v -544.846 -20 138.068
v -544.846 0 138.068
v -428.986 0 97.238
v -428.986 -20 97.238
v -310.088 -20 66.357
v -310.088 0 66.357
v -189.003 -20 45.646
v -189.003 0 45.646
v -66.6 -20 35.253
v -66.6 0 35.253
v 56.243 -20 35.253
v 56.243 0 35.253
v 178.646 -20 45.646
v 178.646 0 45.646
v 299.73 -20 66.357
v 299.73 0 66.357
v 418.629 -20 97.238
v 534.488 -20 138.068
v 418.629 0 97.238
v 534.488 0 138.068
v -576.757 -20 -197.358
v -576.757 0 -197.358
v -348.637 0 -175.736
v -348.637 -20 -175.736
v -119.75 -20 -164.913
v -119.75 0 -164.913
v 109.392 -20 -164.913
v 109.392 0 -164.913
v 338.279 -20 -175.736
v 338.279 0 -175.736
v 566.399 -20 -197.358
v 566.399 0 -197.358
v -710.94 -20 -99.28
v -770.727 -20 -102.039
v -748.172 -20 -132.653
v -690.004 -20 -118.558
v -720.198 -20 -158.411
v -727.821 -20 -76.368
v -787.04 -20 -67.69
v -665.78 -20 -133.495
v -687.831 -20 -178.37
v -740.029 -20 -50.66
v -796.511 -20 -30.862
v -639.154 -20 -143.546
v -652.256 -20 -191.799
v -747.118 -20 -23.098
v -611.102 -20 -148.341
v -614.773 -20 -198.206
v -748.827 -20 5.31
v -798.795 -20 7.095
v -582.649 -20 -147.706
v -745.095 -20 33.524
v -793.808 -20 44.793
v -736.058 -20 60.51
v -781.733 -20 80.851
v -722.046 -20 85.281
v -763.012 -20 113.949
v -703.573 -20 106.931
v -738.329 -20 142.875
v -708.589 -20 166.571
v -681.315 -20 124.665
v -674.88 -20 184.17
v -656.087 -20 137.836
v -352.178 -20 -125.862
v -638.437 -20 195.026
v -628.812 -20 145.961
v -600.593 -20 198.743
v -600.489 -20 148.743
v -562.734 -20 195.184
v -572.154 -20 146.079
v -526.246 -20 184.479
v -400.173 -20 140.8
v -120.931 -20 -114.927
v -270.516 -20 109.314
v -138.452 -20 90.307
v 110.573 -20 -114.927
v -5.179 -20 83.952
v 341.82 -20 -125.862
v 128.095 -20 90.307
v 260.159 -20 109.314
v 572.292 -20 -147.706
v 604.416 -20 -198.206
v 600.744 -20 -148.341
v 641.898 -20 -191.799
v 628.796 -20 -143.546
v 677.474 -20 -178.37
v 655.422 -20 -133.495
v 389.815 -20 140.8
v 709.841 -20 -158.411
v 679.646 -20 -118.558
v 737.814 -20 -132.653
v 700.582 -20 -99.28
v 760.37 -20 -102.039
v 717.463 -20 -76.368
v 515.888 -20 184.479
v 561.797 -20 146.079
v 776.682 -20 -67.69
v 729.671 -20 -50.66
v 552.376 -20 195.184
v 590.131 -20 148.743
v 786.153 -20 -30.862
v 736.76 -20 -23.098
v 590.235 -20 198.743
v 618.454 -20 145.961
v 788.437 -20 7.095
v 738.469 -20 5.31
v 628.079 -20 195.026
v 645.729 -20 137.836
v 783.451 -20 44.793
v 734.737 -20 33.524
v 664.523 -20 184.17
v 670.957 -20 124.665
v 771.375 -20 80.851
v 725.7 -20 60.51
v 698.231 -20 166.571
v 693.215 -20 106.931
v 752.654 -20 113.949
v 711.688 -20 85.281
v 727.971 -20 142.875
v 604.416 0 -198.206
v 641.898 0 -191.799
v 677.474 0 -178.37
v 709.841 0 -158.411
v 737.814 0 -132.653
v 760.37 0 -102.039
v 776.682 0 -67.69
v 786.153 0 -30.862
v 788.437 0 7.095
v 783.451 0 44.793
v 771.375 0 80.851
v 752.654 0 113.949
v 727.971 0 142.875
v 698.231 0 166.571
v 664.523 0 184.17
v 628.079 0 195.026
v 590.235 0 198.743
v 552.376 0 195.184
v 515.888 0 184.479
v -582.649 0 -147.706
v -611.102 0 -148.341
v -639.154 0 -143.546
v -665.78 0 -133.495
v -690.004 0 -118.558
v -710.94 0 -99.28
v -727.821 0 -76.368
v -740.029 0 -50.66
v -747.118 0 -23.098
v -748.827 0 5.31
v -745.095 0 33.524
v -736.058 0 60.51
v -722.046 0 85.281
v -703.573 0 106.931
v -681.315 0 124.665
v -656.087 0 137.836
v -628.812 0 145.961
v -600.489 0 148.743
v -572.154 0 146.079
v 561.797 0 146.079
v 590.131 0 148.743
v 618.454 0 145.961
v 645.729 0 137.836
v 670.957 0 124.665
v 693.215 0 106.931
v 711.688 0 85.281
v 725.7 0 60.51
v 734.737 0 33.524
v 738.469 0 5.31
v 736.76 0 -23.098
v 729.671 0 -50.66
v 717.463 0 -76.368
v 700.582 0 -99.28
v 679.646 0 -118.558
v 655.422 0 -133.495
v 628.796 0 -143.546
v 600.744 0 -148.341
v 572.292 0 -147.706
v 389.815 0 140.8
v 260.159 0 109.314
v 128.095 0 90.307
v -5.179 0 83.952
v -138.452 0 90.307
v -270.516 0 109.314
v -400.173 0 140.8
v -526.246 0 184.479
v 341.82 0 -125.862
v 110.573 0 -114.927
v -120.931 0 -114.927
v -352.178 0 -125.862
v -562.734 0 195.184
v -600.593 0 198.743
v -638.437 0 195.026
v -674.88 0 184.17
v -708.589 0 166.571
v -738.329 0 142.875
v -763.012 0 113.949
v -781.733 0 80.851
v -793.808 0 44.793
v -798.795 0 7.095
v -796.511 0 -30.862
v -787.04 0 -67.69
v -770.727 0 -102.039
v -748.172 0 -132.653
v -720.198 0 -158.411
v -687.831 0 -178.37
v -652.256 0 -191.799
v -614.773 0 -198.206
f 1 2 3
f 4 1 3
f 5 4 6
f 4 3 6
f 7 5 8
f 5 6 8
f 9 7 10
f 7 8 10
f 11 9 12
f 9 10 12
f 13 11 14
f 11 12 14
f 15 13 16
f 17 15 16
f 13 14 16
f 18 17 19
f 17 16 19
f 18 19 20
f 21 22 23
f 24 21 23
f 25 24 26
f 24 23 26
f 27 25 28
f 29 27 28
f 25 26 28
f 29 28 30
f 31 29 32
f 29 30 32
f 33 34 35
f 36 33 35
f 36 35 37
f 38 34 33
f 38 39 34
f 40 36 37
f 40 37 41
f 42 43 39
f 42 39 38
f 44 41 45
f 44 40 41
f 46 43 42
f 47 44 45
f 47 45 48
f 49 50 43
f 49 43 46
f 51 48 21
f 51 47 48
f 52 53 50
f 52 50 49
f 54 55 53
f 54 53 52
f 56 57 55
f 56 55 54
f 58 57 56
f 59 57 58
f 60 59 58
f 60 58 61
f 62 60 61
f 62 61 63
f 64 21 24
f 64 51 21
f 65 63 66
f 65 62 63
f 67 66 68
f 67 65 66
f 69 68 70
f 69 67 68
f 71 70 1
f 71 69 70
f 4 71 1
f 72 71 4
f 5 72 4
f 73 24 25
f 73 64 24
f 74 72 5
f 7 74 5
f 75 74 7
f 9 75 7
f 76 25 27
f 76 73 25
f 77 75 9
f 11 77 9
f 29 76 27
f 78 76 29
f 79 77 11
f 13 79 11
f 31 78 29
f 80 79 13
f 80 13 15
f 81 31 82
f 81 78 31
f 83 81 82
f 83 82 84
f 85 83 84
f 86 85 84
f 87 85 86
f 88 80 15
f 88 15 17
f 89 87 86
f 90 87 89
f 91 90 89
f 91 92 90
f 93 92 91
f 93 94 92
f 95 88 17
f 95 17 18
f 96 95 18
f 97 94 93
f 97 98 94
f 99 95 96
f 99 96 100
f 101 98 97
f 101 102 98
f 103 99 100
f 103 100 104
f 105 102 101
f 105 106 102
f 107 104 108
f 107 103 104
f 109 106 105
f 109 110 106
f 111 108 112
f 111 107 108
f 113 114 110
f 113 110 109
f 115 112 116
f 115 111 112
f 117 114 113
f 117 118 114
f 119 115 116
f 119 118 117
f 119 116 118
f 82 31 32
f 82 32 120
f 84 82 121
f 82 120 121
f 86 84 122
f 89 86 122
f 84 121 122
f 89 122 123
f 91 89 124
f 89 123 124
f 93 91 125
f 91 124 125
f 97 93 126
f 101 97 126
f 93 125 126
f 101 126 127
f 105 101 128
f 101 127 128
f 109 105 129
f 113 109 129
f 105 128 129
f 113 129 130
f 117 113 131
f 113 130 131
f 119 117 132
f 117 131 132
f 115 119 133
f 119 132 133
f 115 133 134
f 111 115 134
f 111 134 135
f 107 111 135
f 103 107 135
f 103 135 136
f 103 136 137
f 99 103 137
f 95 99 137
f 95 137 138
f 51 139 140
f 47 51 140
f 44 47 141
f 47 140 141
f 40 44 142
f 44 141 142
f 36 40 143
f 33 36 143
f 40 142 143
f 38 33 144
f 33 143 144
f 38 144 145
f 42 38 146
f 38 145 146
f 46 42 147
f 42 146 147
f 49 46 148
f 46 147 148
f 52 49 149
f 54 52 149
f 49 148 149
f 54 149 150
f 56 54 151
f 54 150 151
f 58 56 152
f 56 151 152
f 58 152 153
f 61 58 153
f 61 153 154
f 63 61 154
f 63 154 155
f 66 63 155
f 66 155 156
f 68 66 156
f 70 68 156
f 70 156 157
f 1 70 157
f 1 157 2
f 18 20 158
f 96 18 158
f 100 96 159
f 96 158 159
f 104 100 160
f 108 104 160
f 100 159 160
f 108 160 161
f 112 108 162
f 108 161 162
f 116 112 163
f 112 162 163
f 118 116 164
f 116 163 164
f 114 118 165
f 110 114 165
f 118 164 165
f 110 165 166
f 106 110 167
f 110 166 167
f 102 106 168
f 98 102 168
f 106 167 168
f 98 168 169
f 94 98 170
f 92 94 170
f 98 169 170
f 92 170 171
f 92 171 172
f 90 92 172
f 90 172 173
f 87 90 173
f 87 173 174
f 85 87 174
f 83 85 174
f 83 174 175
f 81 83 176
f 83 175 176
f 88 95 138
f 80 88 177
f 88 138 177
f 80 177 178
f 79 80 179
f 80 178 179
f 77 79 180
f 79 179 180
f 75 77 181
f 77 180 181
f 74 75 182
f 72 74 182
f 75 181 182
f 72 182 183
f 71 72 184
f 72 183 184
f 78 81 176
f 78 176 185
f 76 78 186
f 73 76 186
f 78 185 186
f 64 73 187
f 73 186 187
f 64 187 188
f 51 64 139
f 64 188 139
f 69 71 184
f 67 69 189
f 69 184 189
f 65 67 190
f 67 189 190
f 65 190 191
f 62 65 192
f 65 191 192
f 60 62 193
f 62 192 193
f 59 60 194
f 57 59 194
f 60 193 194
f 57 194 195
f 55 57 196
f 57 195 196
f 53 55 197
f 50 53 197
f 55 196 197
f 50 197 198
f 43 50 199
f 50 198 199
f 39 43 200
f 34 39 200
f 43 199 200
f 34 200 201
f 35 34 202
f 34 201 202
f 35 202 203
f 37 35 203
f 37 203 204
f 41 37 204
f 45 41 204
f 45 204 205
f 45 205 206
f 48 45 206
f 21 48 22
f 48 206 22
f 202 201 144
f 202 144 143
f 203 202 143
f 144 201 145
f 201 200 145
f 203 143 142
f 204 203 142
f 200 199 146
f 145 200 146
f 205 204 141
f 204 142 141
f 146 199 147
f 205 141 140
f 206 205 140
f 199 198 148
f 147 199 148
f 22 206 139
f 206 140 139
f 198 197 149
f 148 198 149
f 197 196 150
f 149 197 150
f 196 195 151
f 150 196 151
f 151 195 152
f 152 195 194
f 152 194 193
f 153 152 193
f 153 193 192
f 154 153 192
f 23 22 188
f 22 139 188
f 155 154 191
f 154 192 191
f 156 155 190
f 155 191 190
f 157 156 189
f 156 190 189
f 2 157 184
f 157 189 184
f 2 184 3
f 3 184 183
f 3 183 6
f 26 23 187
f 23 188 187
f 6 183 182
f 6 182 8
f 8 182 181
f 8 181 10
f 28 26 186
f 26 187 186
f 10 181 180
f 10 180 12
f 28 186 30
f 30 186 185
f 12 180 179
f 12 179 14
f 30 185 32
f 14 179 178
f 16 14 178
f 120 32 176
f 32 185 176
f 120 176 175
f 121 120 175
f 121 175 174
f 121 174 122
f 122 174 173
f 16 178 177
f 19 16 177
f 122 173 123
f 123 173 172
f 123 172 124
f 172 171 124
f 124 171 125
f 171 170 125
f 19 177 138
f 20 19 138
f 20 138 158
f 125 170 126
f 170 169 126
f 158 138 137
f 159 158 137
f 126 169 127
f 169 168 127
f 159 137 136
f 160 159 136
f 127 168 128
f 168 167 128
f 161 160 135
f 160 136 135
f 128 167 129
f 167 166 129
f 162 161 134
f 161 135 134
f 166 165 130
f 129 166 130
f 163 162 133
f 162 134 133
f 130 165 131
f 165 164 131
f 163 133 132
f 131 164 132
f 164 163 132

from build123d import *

# Parameters (mm, degrees)
F1_DEPTH = 20


with BuildPart() as f1:
    # F0 (on Front) → F1 (new body)
    with BuildSketch(Plane.XZ):
        with BuildLine():
            ThreePointArc((515.887824, 184.479399), (-5.178885, 83.952454), (-526.245594, 184.479399))
            ThreePointArc((-526.245594, 184.479399), (-797.205456, 26.06358), (-576.7568, -197.358015))
            ThreePointArc((-576.7568, -197.358015), (-5.178885, -163.559701), (566.399031, -197.358015))
            ThreePointArc((566.399031, -197.358015), (786.847687, 26.06358), (515.887824, 184.479399))
        make_face()
        with BuildLine():
            ThreePointArc((-582.649356, -147.706451), (-747.637277, 19.506473), (-544.845819, 138.067852))
            ThreePointArc((-544.845819, 138.067852), (-5.178885, 33.952454), (534.488049, 138.067852))
            ThreePointArc((534.488049, 138.067852), (737.279508, 19.506473), (572.291587, -147.706451))
            ThreePointArc((572.291587, -147.706451), (-5.178885, -113.559701), (-582.649356, -147.706451))
        make_face(mode=Mode.SUBTRACT)
    extrude(amount=F1_DEPTH)


solid = f1.part
